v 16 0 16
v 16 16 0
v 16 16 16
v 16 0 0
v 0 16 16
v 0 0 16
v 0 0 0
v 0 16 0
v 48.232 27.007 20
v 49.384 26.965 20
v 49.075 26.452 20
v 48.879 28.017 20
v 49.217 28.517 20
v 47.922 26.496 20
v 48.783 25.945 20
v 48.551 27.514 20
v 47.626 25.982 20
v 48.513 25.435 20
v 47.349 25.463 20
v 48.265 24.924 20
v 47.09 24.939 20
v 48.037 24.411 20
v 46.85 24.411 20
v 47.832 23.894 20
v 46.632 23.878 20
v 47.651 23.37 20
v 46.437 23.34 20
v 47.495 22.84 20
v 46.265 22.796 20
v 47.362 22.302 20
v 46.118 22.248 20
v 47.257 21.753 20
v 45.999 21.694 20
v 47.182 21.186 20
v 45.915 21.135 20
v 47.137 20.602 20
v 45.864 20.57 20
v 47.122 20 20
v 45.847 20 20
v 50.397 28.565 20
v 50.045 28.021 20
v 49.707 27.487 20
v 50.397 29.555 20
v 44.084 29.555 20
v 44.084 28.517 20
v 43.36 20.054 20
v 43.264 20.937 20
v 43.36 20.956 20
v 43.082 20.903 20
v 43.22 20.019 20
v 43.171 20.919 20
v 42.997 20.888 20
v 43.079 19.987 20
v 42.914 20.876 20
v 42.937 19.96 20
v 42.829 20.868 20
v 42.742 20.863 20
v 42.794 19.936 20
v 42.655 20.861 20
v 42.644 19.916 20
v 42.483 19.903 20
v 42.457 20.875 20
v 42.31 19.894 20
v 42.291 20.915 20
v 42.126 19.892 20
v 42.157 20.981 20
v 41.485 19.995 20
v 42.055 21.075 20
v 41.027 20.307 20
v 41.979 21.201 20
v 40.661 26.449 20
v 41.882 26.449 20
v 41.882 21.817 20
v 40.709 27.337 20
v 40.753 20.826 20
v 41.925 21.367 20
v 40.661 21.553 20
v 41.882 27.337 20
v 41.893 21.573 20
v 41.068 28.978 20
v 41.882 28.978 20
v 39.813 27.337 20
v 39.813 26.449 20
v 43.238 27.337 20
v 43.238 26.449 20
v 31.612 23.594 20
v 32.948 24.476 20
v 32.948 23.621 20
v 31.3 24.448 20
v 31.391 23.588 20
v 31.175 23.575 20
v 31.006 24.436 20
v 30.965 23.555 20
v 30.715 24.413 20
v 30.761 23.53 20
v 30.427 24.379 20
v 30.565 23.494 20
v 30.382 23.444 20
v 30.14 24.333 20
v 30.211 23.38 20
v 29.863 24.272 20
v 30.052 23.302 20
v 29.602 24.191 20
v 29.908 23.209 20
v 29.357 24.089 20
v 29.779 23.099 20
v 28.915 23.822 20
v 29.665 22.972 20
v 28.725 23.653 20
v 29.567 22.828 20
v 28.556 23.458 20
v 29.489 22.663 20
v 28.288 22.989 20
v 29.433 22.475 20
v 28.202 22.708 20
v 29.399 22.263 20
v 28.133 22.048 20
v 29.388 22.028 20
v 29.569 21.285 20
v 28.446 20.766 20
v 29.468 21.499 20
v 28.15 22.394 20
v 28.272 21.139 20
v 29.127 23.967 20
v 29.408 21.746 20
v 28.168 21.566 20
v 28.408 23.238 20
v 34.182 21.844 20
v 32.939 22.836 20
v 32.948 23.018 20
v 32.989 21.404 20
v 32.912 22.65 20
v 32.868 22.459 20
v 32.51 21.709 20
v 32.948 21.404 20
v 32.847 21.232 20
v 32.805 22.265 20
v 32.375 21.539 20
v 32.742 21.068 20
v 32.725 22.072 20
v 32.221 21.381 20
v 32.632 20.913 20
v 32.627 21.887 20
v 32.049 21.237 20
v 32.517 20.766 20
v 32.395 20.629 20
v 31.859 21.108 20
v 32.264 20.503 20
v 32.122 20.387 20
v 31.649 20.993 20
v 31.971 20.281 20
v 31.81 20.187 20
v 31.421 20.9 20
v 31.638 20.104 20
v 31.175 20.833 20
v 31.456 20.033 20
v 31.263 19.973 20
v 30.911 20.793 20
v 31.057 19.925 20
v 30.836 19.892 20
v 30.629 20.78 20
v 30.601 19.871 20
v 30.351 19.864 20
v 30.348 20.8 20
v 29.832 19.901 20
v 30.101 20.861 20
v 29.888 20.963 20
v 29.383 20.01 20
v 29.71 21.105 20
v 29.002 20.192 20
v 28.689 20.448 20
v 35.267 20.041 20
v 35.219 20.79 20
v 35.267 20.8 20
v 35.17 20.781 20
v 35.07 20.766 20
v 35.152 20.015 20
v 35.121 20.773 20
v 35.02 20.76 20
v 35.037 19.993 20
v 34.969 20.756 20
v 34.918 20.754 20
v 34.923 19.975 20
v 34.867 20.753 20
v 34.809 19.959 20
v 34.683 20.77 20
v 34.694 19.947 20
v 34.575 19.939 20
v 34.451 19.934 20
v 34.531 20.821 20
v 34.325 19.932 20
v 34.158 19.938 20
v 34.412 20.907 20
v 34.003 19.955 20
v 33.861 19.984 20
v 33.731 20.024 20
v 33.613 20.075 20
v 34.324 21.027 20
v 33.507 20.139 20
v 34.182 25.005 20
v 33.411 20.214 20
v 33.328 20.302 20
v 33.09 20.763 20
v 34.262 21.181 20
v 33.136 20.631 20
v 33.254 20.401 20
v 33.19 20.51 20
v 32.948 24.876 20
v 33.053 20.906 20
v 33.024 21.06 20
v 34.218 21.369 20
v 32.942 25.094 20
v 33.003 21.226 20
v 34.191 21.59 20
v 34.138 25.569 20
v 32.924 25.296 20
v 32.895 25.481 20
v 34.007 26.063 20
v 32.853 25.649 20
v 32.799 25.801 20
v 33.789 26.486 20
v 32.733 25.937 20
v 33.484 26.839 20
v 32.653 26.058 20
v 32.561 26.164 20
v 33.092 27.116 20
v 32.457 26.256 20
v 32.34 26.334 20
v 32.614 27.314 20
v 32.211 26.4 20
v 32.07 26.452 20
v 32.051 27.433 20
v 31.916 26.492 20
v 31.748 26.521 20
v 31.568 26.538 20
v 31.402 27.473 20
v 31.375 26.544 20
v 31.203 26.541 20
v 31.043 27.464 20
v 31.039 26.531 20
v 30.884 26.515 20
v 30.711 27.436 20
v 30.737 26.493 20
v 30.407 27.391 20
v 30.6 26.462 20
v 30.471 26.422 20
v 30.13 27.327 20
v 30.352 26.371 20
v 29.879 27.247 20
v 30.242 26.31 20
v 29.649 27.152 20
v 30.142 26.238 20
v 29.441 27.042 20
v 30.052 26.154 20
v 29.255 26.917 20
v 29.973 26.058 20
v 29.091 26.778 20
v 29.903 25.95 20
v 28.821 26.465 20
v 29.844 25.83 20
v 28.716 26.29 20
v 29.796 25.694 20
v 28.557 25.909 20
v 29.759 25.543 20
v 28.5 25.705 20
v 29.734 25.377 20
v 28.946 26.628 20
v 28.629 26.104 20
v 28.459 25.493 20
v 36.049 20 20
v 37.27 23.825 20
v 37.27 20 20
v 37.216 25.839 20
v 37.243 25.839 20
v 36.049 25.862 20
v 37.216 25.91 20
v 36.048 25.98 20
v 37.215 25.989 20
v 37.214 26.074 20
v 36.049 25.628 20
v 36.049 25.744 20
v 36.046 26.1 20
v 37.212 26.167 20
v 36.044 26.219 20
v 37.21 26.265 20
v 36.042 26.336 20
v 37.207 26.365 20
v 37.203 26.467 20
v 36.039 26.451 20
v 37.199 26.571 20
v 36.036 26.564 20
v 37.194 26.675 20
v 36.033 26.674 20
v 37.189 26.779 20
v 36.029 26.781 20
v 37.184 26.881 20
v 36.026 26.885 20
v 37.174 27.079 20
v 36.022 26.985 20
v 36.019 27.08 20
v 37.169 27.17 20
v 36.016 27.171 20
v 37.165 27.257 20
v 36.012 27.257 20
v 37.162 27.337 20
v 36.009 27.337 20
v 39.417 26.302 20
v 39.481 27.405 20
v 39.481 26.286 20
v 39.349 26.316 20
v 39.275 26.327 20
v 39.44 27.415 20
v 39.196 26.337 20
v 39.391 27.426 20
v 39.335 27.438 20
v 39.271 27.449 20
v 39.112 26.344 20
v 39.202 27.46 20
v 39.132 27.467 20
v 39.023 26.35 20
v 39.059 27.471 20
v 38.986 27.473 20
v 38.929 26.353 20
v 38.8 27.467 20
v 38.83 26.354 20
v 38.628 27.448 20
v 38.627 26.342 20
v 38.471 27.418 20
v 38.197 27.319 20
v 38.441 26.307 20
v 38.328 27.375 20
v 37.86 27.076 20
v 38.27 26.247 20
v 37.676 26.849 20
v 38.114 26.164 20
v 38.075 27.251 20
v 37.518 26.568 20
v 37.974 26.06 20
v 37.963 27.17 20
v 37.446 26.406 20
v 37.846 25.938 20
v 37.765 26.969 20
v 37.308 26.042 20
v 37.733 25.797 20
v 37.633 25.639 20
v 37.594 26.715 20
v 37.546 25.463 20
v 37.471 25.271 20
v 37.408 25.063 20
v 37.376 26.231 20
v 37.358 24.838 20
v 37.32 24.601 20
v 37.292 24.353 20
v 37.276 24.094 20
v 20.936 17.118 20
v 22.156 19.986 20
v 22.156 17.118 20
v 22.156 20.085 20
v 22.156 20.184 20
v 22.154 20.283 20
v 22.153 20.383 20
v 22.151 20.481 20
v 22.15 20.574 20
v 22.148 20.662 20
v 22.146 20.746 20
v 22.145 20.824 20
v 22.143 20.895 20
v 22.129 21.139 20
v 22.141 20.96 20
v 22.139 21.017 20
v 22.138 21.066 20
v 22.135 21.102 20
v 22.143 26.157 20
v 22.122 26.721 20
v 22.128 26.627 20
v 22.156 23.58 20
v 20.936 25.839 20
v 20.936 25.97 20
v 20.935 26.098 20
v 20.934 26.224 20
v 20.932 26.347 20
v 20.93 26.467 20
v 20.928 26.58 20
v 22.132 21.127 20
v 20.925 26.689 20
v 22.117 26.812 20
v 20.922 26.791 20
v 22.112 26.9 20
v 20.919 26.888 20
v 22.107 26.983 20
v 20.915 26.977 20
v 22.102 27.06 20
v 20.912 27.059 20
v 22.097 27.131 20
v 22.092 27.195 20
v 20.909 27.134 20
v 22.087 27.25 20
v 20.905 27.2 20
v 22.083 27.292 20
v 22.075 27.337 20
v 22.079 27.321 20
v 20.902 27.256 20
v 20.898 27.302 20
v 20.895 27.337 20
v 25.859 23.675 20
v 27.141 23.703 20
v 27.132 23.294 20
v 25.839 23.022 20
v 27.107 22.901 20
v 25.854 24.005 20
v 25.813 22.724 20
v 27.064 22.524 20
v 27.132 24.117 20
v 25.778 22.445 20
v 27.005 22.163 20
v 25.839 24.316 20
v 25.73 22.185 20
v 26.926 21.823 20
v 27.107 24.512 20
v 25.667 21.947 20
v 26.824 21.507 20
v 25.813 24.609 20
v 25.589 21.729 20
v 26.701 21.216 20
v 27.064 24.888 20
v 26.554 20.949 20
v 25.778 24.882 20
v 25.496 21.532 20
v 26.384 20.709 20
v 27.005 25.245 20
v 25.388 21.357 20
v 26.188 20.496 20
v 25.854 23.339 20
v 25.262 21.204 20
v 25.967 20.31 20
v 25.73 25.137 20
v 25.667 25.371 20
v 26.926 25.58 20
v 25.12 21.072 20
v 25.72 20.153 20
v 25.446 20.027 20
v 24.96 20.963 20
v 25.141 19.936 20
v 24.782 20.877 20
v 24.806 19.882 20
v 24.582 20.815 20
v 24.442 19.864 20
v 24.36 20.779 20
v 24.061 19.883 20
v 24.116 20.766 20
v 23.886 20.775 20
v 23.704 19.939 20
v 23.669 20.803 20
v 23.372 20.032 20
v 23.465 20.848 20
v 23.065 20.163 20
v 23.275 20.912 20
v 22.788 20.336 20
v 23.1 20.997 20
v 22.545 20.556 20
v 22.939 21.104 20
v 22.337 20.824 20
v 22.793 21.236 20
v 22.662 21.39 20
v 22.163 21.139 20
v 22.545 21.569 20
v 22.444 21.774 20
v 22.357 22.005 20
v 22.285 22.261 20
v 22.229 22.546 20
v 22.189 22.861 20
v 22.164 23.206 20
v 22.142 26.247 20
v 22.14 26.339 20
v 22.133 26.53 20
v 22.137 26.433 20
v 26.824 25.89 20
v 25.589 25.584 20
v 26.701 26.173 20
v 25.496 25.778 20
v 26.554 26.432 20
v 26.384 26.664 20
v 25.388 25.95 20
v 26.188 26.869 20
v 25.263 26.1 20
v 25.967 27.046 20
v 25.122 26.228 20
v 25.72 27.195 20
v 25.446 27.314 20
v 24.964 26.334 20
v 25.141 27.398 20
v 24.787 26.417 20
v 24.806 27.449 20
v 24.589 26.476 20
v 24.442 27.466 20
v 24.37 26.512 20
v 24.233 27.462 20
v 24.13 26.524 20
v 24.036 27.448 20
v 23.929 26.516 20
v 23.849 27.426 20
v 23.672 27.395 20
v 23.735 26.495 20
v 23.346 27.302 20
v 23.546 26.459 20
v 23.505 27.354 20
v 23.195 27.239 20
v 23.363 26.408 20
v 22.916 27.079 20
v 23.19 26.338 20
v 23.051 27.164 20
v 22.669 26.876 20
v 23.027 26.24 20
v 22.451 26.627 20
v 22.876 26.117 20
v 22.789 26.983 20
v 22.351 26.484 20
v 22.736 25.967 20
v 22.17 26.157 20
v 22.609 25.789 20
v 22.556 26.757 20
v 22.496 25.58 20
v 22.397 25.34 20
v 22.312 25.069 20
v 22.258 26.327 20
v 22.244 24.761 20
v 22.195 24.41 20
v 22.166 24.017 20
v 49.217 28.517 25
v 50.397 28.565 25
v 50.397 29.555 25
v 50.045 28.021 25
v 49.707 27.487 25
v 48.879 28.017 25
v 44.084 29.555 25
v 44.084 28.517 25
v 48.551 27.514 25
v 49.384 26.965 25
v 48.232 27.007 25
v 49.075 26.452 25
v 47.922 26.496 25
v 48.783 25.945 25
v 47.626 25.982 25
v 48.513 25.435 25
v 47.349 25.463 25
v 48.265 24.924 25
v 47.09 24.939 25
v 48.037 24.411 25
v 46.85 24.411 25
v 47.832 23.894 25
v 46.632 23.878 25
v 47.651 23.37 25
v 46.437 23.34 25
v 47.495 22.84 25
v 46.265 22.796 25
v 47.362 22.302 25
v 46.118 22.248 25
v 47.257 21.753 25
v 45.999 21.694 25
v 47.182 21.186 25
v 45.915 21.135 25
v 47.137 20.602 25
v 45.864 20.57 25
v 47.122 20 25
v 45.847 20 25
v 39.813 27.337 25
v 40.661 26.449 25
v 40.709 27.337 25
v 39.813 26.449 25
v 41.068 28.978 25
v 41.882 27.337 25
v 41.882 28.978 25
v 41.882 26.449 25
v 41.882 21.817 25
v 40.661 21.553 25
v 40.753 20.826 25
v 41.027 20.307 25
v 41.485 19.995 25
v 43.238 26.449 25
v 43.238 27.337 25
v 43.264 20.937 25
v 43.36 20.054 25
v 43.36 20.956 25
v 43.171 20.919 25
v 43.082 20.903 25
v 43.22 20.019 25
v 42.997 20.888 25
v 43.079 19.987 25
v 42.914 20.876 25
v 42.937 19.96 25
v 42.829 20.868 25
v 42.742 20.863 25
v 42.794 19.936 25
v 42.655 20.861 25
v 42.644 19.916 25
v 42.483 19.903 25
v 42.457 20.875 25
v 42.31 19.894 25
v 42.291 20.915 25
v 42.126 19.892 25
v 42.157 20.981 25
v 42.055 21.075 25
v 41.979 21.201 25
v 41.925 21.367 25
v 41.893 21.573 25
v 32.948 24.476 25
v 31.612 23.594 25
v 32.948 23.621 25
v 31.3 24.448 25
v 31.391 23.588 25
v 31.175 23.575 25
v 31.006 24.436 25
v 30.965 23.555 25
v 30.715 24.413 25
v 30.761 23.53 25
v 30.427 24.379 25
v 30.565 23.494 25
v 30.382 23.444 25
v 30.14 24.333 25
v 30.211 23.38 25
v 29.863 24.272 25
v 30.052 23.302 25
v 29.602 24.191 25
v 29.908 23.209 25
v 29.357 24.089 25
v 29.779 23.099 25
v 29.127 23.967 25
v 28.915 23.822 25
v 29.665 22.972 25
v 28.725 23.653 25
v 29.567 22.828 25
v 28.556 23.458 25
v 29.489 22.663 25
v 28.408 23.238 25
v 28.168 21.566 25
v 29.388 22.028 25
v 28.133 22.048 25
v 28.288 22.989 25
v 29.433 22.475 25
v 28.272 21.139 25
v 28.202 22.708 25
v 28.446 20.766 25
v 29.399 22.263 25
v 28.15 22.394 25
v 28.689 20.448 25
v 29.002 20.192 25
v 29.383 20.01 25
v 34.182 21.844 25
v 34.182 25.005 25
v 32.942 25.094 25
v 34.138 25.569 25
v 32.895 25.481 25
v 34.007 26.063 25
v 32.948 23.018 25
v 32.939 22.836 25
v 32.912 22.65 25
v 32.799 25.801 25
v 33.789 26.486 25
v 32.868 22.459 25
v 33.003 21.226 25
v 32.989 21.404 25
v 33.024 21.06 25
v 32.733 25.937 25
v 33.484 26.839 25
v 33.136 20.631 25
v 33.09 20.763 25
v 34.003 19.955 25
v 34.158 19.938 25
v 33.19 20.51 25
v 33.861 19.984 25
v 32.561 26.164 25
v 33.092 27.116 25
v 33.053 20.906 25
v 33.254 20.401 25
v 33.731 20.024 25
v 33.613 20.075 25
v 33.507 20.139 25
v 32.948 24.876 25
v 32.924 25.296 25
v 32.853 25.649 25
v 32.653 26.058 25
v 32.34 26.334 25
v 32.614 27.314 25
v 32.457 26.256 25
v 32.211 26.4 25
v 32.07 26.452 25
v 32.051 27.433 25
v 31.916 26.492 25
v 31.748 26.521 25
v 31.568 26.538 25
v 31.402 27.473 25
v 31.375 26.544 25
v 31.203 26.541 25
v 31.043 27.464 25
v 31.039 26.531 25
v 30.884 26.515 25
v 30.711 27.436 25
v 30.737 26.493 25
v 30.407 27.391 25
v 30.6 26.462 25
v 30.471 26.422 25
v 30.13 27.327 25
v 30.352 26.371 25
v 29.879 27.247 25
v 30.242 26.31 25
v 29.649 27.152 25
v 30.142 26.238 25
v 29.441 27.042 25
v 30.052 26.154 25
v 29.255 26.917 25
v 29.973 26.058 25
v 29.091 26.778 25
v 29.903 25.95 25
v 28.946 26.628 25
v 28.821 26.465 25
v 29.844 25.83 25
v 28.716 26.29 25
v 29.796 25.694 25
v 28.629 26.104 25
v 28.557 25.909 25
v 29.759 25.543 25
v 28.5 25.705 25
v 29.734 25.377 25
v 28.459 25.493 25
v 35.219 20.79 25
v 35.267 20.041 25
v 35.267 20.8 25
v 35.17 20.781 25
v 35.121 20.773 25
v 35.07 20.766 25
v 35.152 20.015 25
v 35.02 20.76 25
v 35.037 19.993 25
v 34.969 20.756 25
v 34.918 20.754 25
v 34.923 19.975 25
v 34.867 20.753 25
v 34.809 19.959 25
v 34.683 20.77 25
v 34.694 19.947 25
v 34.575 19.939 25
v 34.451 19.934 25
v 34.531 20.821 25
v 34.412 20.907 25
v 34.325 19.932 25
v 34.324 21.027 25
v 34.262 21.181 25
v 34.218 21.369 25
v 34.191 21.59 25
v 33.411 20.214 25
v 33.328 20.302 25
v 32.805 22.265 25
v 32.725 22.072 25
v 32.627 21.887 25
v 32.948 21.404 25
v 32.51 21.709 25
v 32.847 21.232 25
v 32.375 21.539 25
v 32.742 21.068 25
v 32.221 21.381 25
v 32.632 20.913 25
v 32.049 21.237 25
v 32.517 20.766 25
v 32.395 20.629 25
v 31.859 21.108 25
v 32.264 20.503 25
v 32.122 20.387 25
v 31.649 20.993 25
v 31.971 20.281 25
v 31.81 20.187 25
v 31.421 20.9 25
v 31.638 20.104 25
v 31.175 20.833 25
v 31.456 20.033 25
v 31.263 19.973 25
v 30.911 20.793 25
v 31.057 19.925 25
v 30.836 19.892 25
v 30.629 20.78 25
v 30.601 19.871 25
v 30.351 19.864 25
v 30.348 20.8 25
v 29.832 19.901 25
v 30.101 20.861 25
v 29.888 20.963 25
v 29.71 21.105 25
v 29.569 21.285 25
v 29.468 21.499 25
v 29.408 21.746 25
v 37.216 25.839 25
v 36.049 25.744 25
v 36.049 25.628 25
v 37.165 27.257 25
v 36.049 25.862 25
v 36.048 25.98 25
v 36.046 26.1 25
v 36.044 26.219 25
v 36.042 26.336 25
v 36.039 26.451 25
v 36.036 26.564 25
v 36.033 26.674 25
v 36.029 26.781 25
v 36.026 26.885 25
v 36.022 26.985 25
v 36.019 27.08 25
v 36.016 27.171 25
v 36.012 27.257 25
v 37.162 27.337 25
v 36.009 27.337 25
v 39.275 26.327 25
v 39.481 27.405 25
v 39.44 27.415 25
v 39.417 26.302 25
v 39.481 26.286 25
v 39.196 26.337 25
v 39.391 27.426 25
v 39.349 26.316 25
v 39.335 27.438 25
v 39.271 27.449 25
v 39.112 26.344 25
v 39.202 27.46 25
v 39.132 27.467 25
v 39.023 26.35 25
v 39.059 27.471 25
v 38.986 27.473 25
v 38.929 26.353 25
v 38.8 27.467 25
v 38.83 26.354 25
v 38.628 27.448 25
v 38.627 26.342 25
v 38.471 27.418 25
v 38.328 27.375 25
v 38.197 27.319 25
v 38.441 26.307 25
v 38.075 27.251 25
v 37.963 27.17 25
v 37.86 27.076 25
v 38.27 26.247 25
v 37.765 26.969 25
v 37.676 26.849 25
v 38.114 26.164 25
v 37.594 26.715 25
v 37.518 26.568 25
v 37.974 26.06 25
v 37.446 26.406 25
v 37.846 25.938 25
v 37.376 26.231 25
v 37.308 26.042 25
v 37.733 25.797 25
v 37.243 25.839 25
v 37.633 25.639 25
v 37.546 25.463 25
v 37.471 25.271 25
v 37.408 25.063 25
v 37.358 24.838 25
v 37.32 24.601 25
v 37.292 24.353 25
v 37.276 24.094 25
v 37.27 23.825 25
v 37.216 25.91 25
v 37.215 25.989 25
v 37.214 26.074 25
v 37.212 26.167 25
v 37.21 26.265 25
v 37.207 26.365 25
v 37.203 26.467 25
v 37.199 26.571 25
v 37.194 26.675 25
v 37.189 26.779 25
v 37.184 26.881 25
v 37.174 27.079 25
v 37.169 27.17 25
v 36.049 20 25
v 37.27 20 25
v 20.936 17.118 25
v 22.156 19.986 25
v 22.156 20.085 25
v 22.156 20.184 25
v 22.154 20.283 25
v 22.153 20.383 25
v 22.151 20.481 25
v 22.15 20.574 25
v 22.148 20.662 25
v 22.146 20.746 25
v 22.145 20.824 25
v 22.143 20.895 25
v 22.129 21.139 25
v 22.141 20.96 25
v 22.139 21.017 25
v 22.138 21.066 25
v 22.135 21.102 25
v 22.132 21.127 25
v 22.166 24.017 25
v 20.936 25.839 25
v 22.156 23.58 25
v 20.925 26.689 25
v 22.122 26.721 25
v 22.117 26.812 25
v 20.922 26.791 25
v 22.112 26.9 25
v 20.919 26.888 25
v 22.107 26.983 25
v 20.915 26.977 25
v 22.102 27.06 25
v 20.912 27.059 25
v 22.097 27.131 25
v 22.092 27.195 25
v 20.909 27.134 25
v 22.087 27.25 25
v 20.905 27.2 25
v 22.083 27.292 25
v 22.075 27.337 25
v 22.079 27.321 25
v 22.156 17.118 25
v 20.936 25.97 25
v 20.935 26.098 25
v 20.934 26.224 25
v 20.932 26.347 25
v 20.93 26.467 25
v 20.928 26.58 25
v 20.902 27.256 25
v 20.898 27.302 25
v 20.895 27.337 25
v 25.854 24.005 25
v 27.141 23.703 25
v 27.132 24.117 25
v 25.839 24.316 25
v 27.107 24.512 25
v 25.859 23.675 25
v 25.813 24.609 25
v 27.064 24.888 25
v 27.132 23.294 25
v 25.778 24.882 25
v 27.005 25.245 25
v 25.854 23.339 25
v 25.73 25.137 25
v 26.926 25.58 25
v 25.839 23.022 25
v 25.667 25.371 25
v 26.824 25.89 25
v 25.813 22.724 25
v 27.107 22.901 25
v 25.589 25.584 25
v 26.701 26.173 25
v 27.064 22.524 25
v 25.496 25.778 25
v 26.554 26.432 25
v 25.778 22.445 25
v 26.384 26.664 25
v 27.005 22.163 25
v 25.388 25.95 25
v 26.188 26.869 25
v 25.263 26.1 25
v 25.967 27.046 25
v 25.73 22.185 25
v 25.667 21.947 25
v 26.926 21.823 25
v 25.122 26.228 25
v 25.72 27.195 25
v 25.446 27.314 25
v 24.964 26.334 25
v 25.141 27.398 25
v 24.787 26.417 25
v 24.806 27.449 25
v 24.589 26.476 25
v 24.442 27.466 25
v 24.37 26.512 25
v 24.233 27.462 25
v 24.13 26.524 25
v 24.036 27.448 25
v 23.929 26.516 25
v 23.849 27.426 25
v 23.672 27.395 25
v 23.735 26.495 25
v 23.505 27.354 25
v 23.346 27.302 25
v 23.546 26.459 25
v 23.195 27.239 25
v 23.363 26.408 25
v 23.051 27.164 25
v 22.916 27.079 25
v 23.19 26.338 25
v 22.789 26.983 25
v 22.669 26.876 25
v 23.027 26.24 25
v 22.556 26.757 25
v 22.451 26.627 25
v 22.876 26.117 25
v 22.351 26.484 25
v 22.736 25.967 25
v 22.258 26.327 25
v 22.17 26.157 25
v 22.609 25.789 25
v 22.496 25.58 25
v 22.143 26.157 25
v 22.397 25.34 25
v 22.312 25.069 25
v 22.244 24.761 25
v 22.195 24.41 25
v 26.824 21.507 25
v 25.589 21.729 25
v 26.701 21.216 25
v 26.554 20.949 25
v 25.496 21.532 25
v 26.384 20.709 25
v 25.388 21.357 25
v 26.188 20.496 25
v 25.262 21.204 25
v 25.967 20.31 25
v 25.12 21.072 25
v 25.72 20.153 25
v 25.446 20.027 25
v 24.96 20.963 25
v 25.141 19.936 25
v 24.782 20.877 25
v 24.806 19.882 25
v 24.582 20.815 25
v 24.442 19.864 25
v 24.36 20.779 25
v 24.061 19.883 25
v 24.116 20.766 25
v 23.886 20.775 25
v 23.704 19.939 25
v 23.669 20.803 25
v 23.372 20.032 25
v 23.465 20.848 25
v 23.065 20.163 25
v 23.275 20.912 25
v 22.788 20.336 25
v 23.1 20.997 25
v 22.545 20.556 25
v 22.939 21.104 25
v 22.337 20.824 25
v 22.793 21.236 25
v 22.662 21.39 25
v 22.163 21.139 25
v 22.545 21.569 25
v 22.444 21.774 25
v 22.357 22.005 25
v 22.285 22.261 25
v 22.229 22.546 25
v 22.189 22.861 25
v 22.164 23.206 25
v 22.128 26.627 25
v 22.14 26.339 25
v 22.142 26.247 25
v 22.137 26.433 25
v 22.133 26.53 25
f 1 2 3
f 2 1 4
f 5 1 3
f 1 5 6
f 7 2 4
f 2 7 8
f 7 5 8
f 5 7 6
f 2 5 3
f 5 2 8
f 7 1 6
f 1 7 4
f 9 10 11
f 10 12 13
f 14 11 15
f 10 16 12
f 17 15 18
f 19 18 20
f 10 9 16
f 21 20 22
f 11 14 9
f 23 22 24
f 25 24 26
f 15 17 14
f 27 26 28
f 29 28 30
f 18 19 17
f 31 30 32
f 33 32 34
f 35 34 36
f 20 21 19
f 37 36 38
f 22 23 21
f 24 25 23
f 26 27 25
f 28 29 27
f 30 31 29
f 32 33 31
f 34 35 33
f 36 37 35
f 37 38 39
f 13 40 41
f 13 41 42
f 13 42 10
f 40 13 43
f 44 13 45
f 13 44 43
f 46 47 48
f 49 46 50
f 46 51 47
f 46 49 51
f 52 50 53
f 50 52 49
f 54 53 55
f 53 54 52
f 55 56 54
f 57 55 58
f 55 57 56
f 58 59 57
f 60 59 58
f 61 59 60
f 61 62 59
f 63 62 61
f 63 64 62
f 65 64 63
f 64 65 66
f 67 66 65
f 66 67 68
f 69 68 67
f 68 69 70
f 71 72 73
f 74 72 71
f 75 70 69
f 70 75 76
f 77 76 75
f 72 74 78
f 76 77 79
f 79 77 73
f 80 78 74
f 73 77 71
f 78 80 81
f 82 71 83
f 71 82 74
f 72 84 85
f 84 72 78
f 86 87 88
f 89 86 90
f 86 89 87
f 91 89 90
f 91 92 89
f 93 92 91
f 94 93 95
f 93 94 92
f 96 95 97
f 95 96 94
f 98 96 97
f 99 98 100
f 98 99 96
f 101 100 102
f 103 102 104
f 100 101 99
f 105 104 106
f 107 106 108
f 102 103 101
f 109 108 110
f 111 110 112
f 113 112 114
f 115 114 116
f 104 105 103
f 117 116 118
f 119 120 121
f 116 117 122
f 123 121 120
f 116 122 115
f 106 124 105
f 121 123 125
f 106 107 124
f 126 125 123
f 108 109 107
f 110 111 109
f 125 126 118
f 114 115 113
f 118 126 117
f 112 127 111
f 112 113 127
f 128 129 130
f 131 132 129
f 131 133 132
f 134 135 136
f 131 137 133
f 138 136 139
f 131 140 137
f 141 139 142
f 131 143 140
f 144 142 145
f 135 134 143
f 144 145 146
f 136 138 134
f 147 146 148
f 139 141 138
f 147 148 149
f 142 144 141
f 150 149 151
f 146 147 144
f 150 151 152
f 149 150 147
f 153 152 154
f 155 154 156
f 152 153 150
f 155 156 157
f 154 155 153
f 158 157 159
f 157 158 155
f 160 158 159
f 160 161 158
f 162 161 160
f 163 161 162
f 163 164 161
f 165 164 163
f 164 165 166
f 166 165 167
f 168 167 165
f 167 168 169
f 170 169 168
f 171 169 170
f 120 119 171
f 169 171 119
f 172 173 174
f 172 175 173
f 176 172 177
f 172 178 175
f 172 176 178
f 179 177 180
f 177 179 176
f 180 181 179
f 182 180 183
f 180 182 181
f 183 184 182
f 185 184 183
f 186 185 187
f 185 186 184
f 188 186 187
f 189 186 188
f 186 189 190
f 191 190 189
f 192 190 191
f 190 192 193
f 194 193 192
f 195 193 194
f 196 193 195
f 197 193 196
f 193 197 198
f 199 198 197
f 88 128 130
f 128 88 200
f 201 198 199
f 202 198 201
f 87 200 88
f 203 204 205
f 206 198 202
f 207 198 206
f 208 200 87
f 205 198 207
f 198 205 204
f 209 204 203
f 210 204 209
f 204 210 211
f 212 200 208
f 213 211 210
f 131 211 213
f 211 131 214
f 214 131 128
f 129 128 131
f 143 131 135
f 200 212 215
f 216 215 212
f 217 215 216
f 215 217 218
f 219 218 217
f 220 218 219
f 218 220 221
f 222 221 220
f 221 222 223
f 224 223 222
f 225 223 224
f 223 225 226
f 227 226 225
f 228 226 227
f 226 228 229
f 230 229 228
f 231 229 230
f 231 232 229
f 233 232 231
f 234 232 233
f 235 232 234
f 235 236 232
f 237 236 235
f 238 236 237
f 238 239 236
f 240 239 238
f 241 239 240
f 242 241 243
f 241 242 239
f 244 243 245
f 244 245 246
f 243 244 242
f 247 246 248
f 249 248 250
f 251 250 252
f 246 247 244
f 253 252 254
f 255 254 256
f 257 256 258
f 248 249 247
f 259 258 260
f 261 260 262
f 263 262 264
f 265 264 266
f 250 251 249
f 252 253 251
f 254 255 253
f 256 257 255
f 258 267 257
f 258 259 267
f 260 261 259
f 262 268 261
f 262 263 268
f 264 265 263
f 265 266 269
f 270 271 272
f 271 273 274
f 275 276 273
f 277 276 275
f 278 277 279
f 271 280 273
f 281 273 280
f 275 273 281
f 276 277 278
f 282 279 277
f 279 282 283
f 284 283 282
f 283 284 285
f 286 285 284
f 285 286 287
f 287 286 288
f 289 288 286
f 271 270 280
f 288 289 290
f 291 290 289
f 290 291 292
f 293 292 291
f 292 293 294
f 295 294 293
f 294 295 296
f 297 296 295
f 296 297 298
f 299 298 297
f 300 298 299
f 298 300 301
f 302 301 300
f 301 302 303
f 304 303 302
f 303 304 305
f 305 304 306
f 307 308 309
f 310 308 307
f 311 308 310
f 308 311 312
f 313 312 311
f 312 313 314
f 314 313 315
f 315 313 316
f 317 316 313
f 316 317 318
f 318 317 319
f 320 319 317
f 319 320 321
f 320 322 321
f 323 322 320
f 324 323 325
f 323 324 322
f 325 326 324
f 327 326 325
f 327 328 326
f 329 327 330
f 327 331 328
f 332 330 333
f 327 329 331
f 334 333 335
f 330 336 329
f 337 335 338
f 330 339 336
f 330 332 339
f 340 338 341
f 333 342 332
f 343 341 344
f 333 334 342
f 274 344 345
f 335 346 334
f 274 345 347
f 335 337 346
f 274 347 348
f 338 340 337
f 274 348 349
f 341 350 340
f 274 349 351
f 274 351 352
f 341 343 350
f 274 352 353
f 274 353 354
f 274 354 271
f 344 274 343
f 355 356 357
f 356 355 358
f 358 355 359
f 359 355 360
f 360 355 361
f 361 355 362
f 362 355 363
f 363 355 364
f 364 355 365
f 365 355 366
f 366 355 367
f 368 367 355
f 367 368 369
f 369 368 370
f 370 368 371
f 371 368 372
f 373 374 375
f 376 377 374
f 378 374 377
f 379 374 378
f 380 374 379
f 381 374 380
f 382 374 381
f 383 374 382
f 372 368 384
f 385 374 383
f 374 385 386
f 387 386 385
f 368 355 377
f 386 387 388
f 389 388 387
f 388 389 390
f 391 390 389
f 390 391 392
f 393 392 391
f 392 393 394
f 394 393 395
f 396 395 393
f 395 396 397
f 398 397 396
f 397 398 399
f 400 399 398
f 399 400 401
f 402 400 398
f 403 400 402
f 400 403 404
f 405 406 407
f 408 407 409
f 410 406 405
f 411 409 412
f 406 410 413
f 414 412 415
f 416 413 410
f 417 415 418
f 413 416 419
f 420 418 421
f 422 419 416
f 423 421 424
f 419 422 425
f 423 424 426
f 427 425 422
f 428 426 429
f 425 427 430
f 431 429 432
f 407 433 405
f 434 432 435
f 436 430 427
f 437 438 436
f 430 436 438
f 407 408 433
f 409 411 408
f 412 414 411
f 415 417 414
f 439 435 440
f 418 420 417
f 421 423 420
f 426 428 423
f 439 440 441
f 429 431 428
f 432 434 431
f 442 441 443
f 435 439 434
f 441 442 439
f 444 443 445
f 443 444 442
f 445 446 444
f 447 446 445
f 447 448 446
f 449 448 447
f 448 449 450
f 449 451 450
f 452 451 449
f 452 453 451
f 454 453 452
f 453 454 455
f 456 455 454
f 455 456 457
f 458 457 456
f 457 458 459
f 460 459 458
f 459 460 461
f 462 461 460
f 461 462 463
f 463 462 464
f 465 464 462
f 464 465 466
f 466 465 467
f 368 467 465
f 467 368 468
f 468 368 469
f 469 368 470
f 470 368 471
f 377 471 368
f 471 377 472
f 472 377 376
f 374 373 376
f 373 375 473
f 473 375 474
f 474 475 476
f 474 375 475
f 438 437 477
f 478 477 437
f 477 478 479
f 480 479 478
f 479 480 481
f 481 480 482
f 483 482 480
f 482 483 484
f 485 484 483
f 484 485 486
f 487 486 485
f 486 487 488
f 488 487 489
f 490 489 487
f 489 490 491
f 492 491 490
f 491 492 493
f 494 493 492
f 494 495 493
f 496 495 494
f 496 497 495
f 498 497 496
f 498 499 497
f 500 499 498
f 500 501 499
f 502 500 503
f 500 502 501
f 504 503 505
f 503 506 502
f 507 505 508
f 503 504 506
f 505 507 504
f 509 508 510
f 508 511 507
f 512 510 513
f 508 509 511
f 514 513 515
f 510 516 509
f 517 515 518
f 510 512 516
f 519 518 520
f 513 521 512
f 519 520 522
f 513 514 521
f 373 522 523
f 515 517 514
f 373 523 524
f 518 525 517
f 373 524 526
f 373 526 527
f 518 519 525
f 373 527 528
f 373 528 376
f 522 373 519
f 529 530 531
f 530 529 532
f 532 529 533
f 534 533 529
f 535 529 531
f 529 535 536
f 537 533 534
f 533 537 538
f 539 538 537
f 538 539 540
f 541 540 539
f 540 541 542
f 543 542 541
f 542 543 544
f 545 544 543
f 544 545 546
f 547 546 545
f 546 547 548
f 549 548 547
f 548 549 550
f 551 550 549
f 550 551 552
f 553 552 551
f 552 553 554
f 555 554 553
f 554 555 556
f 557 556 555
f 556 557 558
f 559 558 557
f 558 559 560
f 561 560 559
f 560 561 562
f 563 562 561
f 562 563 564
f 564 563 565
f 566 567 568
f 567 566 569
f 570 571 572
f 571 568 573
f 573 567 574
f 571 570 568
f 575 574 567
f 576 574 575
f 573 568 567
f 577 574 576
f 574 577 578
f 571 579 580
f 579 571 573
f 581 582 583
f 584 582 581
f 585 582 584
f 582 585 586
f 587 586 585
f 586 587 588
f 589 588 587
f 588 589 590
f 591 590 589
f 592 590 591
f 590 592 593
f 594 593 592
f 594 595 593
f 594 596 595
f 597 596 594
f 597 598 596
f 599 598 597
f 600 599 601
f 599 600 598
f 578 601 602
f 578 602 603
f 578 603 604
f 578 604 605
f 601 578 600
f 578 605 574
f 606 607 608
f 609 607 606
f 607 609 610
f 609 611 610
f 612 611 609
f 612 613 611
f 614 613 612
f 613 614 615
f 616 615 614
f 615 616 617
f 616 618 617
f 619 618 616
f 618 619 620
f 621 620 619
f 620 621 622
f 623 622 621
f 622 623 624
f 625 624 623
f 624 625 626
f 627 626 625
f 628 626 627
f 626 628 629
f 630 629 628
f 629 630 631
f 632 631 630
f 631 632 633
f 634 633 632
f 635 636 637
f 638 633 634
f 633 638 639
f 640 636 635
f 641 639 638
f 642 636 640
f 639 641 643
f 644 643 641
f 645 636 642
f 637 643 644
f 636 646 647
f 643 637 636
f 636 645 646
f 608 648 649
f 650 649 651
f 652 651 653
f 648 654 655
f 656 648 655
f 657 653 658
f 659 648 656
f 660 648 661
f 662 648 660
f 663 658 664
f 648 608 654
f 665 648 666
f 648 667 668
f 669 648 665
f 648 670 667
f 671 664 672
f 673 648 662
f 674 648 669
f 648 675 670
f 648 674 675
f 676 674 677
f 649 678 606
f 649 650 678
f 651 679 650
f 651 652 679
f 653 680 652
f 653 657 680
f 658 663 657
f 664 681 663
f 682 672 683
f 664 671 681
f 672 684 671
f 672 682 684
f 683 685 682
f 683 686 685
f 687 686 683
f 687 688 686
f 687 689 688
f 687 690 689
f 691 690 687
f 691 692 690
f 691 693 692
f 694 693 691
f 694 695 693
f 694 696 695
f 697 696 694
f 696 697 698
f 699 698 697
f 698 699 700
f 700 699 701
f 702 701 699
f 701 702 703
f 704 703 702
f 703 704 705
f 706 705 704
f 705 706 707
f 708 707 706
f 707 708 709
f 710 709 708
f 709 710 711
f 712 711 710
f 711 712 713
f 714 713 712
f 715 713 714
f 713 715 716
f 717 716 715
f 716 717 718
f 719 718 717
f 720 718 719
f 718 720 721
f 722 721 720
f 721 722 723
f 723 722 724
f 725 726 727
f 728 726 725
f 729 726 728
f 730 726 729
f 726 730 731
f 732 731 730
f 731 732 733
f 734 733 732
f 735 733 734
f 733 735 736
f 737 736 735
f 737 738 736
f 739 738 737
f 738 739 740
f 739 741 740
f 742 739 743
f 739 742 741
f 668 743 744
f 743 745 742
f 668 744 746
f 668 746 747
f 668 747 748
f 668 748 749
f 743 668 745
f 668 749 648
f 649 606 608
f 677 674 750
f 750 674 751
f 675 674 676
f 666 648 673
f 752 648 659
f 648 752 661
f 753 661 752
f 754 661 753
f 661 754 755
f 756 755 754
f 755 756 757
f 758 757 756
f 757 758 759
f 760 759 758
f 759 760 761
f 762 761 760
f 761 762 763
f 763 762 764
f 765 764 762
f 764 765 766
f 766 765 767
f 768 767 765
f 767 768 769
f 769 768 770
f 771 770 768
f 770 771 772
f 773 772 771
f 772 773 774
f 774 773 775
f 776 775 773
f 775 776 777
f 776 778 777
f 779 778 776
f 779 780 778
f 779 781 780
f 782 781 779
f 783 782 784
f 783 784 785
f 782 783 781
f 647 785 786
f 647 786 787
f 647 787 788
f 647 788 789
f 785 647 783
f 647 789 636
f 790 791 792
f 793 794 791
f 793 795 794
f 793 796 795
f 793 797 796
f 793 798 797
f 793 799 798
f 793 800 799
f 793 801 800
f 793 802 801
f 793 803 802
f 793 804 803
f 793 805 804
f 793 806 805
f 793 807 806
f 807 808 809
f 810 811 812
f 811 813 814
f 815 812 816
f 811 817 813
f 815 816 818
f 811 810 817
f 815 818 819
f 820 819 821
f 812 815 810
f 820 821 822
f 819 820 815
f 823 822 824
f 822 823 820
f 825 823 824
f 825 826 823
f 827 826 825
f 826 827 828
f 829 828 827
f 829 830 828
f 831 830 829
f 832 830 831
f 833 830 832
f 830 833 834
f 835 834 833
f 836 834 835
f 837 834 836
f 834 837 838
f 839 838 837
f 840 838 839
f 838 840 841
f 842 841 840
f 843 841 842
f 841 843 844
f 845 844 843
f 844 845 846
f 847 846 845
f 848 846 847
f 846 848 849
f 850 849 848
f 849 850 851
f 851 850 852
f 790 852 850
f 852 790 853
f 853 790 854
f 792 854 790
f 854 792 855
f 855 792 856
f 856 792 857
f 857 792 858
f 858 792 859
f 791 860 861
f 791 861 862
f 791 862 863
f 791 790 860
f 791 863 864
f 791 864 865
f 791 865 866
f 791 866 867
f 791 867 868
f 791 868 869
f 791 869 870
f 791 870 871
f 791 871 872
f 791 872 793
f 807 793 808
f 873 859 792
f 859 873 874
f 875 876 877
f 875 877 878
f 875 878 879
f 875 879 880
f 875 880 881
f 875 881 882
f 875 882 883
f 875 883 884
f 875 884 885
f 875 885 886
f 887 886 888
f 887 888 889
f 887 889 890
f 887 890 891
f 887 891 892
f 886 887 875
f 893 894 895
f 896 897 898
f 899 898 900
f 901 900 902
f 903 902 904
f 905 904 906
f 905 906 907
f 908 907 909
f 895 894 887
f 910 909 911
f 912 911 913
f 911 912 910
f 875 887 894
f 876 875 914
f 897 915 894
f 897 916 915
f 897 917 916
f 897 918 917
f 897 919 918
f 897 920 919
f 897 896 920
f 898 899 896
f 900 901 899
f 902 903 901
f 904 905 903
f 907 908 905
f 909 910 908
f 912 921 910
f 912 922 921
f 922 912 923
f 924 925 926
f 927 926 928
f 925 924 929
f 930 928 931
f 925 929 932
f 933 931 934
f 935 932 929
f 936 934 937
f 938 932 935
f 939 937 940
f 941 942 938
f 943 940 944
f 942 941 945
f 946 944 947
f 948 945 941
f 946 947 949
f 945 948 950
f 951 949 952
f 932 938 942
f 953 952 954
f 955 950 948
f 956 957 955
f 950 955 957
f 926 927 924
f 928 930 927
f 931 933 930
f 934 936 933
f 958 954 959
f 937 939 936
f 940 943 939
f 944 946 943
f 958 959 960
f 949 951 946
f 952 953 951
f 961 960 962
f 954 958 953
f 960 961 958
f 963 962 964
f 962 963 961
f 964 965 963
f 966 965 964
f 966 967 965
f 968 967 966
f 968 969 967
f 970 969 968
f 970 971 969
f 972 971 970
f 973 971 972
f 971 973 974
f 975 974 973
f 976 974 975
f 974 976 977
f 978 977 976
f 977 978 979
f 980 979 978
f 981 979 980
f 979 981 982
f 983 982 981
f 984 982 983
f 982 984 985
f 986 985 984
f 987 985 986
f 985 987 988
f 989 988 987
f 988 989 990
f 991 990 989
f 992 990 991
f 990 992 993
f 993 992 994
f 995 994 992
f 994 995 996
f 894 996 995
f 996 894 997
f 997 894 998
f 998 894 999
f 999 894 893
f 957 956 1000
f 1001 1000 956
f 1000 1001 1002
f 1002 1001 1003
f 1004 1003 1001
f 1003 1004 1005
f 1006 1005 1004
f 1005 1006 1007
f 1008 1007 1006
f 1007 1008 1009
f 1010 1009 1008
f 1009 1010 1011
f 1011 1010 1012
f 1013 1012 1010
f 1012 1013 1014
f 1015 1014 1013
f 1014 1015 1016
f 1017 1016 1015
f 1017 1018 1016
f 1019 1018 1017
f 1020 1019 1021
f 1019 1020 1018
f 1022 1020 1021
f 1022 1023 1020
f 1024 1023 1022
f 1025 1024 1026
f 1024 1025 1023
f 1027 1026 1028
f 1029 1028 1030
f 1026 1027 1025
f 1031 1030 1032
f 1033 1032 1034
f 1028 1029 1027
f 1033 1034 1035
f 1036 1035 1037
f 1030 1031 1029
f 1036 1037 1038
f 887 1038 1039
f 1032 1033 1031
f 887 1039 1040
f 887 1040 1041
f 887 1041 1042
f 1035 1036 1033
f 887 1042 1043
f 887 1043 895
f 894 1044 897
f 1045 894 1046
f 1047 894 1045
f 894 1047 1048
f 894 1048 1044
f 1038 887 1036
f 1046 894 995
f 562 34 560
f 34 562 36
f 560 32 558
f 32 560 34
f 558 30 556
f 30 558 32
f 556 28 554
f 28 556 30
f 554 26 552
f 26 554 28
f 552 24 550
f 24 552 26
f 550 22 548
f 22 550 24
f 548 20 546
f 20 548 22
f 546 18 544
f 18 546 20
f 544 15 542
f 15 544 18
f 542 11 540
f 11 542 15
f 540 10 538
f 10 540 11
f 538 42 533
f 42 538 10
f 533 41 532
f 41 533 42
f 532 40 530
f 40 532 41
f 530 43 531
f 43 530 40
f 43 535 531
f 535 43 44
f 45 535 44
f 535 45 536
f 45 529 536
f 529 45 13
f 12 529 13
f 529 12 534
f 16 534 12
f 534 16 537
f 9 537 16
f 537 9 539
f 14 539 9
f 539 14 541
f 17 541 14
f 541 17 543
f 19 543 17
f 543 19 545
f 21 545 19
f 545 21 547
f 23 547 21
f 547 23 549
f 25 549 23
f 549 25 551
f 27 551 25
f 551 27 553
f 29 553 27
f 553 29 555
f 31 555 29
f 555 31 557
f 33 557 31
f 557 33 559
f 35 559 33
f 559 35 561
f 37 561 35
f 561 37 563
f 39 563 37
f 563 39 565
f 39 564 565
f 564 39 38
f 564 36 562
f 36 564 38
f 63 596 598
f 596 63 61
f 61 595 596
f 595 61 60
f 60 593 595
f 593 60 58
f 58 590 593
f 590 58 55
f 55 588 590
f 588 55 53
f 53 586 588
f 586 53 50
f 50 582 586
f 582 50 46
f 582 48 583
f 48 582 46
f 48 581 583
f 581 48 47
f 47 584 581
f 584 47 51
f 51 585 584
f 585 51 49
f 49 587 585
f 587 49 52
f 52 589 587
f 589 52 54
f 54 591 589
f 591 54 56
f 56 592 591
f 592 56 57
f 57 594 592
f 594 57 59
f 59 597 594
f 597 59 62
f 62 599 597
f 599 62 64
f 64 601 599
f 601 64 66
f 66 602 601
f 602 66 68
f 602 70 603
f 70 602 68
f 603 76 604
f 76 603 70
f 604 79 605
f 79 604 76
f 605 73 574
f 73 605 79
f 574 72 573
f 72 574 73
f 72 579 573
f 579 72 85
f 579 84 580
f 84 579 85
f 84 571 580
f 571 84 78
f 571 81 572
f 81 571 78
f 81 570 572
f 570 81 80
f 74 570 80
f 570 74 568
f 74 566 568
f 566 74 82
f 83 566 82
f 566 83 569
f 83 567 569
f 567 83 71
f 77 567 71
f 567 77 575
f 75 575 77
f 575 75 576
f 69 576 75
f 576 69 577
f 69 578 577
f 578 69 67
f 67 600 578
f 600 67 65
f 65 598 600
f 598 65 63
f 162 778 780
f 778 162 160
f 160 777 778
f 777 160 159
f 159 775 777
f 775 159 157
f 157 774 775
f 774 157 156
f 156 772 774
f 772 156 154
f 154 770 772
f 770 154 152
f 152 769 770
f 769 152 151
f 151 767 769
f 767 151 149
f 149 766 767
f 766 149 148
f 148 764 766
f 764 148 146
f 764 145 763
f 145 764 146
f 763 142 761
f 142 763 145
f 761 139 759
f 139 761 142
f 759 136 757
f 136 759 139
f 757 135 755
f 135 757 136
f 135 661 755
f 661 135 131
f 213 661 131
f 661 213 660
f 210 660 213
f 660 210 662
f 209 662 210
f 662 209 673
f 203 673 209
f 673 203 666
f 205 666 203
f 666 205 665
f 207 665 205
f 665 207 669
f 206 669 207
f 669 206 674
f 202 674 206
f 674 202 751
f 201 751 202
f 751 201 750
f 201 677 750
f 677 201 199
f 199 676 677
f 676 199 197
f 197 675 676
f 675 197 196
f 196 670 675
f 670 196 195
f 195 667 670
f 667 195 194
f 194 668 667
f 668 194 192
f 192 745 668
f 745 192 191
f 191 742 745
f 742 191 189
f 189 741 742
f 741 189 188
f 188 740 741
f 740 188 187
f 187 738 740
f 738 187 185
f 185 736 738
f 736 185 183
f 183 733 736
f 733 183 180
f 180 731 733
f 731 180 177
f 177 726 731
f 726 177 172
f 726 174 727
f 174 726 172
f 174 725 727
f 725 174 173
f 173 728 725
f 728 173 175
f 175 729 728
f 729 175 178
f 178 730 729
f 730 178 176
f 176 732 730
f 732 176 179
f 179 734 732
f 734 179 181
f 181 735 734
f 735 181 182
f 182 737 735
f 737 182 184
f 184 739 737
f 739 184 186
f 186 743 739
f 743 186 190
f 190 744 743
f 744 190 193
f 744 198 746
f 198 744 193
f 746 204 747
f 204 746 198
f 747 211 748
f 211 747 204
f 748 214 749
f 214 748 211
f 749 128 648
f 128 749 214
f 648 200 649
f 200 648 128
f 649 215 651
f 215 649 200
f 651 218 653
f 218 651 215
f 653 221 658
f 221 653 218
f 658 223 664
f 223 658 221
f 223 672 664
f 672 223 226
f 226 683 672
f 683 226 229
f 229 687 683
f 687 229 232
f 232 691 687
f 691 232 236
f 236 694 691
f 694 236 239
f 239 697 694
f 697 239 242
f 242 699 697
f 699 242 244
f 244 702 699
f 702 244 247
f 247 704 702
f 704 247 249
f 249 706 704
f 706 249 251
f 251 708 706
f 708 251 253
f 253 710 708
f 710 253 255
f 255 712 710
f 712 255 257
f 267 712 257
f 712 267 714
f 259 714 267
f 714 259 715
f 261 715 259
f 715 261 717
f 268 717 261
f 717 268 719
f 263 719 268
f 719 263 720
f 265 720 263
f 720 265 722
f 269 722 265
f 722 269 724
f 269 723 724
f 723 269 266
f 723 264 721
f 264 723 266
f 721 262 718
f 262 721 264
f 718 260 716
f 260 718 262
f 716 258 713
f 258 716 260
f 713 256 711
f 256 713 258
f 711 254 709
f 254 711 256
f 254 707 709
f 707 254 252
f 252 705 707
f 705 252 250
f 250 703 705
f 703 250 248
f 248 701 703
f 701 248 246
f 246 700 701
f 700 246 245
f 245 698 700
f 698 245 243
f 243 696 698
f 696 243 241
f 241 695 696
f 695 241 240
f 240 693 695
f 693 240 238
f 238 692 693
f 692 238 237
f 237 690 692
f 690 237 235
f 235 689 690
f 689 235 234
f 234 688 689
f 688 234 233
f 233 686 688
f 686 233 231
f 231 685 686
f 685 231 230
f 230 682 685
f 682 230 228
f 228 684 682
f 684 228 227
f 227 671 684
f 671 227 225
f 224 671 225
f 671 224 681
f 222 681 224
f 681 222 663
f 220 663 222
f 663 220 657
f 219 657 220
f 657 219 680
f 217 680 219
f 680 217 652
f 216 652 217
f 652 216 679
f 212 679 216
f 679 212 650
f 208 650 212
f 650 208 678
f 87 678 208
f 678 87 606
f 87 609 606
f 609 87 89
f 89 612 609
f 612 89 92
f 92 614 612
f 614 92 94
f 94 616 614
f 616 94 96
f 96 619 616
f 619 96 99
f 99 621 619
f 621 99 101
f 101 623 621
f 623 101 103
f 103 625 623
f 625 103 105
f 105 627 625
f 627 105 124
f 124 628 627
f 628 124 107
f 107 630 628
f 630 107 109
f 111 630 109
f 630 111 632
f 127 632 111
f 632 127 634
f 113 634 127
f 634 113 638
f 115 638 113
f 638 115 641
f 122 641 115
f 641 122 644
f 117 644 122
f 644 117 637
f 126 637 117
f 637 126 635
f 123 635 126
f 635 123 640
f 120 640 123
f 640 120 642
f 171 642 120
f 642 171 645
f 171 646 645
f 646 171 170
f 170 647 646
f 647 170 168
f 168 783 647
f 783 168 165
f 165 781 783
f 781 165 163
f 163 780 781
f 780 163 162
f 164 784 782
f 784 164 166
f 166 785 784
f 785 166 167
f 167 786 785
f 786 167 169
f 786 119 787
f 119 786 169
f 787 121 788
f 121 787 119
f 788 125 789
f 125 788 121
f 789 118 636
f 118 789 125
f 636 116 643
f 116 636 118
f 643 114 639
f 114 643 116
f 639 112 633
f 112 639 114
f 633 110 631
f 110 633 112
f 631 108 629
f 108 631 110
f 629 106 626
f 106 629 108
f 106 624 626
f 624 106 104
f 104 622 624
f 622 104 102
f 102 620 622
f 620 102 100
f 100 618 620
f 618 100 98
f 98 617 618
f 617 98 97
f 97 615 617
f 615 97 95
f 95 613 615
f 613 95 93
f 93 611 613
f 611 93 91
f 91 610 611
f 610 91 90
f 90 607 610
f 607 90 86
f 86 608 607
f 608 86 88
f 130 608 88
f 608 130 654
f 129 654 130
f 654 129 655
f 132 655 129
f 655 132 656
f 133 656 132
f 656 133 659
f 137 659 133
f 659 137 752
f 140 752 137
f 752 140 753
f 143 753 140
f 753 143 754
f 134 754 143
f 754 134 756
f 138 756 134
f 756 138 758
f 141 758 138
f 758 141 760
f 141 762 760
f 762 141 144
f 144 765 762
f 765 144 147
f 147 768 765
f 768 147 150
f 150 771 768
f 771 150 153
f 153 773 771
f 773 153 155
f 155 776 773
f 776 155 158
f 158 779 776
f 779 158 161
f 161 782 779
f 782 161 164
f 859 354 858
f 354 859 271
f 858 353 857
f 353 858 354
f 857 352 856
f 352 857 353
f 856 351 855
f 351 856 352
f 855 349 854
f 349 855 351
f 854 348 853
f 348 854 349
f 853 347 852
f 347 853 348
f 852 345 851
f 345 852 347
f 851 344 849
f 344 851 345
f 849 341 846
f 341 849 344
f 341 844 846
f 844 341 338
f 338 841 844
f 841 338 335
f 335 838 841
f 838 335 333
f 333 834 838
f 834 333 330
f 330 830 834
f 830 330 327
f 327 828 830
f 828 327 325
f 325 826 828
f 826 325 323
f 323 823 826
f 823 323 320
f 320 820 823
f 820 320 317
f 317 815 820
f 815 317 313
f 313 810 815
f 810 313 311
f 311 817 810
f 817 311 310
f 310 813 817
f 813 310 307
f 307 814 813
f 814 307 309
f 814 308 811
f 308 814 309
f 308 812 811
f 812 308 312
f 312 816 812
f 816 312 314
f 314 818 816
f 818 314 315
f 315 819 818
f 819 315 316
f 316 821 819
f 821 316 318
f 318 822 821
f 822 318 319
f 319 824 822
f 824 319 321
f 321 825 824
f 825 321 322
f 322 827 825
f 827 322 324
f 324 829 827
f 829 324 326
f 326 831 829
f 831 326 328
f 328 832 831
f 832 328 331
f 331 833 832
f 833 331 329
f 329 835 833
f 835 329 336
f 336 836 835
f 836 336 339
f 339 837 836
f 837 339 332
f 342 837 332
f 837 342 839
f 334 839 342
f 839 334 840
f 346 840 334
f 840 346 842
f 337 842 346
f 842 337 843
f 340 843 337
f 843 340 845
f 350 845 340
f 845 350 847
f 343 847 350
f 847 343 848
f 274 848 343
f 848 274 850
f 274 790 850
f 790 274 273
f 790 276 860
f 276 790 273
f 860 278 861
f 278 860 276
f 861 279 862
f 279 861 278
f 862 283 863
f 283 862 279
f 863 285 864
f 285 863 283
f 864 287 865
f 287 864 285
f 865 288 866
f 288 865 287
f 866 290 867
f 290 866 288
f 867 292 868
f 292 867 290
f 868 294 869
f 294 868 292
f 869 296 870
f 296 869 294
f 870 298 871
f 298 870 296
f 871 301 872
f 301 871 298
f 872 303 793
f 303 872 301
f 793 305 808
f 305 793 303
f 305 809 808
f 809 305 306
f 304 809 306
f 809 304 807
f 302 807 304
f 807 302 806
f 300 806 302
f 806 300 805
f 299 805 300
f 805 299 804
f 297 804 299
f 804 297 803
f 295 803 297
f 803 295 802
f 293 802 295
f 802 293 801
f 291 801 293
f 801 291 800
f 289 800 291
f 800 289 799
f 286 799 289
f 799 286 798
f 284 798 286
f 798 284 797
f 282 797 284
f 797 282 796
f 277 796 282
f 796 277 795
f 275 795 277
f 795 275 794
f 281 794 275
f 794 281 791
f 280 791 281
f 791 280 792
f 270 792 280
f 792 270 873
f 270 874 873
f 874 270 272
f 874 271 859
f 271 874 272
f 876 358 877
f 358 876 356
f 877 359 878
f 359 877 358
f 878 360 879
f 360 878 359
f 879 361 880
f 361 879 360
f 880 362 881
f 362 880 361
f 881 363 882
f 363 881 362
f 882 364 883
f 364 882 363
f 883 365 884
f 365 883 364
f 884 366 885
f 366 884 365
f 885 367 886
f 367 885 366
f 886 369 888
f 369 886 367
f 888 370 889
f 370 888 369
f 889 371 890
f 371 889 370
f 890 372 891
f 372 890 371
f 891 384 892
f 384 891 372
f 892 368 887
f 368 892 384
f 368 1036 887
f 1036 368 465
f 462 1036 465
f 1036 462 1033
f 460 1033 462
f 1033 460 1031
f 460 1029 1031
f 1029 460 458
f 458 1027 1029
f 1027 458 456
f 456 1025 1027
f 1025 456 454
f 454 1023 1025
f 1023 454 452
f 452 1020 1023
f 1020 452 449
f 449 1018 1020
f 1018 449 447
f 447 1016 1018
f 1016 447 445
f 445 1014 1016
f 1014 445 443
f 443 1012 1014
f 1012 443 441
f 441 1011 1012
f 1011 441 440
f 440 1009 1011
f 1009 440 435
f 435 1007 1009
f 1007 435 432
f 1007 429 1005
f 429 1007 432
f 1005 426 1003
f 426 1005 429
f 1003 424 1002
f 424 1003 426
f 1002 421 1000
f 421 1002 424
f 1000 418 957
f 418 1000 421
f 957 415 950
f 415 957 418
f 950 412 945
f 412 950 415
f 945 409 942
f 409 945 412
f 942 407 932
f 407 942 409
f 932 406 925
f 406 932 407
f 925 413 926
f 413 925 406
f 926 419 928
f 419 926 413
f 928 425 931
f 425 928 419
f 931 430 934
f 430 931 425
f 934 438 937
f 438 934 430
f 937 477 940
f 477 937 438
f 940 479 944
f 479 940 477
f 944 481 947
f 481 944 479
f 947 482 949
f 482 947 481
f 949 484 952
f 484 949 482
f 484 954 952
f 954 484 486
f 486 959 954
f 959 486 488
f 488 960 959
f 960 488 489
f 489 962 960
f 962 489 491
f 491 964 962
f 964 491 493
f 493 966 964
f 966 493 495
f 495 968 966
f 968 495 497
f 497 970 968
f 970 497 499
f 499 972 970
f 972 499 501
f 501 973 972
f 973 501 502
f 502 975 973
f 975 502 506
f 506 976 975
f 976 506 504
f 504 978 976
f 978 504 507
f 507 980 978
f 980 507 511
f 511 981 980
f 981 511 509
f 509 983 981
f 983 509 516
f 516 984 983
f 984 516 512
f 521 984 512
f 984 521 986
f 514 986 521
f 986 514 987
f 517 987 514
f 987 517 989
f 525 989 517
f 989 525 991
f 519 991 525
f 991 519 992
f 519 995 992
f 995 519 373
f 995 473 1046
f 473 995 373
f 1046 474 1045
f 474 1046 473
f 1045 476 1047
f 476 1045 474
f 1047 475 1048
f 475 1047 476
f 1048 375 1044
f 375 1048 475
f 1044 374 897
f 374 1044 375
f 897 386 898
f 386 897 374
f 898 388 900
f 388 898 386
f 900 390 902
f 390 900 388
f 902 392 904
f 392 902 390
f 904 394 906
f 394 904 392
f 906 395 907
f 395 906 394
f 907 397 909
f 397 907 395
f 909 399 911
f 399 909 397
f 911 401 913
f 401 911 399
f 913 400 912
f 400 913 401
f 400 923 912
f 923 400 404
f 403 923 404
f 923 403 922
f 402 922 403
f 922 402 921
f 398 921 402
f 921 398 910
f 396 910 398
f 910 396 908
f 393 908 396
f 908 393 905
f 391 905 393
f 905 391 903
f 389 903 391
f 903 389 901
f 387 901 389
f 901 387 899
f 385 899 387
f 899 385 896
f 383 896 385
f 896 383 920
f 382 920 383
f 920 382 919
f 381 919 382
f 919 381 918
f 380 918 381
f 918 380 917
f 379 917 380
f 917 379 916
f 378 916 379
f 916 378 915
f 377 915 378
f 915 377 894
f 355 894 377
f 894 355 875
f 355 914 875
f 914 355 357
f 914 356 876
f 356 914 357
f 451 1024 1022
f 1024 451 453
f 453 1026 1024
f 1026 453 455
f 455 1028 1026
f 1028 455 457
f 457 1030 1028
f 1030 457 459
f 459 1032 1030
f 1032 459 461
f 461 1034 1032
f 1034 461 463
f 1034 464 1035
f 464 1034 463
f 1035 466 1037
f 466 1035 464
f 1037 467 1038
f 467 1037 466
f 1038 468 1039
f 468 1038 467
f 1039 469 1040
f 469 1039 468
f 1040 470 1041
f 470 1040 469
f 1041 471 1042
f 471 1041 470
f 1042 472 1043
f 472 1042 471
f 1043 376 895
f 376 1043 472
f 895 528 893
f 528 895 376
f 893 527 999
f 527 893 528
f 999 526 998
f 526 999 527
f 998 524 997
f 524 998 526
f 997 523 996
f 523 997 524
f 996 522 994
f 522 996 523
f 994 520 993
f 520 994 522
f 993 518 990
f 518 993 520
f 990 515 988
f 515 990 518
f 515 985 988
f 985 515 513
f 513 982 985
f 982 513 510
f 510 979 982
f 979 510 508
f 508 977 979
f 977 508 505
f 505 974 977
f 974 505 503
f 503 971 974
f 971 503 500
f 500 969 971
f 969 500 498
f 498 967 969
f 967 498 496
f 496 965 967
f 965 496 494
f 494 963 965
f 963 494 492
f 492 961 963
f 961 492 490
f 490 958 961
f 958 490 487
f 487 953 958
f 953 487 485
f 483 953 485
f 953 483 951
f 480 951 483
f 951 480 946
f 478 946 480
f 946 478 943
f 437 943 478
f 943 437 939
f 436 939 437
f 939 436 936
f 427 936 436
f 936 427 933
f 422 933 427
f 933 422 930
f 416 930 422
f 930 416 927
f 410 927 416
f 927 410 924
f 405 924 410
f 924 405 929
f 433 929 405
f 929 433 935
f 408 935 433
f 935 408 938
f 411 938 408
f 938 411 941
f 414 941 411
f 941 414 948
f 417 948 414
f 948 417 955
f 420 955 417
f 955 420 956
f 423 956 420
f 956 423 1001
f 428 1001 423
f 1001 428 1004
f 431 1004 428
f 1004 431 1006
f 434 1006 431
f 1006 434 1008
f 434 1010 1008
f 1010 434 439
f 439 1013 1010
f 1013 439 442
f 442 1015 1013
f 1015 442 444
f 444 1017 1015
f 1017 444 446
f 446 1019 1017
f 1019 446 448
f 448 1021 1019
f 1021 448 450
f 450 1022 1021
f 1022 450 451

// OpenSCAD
//[CUSTOMIZATION]
// X Dimension
xdim=16;
// Y Dimension
ydim=7;
// Z Dimension
zdim=11;
// Message
txt="part7";
module __END_CUSTOMIZATIONS () {}
cube(xdim,ydim,zdim);
translate([20,20,20]) { linear_extrude(5) text(txt, font="Liberation Sans"); }
